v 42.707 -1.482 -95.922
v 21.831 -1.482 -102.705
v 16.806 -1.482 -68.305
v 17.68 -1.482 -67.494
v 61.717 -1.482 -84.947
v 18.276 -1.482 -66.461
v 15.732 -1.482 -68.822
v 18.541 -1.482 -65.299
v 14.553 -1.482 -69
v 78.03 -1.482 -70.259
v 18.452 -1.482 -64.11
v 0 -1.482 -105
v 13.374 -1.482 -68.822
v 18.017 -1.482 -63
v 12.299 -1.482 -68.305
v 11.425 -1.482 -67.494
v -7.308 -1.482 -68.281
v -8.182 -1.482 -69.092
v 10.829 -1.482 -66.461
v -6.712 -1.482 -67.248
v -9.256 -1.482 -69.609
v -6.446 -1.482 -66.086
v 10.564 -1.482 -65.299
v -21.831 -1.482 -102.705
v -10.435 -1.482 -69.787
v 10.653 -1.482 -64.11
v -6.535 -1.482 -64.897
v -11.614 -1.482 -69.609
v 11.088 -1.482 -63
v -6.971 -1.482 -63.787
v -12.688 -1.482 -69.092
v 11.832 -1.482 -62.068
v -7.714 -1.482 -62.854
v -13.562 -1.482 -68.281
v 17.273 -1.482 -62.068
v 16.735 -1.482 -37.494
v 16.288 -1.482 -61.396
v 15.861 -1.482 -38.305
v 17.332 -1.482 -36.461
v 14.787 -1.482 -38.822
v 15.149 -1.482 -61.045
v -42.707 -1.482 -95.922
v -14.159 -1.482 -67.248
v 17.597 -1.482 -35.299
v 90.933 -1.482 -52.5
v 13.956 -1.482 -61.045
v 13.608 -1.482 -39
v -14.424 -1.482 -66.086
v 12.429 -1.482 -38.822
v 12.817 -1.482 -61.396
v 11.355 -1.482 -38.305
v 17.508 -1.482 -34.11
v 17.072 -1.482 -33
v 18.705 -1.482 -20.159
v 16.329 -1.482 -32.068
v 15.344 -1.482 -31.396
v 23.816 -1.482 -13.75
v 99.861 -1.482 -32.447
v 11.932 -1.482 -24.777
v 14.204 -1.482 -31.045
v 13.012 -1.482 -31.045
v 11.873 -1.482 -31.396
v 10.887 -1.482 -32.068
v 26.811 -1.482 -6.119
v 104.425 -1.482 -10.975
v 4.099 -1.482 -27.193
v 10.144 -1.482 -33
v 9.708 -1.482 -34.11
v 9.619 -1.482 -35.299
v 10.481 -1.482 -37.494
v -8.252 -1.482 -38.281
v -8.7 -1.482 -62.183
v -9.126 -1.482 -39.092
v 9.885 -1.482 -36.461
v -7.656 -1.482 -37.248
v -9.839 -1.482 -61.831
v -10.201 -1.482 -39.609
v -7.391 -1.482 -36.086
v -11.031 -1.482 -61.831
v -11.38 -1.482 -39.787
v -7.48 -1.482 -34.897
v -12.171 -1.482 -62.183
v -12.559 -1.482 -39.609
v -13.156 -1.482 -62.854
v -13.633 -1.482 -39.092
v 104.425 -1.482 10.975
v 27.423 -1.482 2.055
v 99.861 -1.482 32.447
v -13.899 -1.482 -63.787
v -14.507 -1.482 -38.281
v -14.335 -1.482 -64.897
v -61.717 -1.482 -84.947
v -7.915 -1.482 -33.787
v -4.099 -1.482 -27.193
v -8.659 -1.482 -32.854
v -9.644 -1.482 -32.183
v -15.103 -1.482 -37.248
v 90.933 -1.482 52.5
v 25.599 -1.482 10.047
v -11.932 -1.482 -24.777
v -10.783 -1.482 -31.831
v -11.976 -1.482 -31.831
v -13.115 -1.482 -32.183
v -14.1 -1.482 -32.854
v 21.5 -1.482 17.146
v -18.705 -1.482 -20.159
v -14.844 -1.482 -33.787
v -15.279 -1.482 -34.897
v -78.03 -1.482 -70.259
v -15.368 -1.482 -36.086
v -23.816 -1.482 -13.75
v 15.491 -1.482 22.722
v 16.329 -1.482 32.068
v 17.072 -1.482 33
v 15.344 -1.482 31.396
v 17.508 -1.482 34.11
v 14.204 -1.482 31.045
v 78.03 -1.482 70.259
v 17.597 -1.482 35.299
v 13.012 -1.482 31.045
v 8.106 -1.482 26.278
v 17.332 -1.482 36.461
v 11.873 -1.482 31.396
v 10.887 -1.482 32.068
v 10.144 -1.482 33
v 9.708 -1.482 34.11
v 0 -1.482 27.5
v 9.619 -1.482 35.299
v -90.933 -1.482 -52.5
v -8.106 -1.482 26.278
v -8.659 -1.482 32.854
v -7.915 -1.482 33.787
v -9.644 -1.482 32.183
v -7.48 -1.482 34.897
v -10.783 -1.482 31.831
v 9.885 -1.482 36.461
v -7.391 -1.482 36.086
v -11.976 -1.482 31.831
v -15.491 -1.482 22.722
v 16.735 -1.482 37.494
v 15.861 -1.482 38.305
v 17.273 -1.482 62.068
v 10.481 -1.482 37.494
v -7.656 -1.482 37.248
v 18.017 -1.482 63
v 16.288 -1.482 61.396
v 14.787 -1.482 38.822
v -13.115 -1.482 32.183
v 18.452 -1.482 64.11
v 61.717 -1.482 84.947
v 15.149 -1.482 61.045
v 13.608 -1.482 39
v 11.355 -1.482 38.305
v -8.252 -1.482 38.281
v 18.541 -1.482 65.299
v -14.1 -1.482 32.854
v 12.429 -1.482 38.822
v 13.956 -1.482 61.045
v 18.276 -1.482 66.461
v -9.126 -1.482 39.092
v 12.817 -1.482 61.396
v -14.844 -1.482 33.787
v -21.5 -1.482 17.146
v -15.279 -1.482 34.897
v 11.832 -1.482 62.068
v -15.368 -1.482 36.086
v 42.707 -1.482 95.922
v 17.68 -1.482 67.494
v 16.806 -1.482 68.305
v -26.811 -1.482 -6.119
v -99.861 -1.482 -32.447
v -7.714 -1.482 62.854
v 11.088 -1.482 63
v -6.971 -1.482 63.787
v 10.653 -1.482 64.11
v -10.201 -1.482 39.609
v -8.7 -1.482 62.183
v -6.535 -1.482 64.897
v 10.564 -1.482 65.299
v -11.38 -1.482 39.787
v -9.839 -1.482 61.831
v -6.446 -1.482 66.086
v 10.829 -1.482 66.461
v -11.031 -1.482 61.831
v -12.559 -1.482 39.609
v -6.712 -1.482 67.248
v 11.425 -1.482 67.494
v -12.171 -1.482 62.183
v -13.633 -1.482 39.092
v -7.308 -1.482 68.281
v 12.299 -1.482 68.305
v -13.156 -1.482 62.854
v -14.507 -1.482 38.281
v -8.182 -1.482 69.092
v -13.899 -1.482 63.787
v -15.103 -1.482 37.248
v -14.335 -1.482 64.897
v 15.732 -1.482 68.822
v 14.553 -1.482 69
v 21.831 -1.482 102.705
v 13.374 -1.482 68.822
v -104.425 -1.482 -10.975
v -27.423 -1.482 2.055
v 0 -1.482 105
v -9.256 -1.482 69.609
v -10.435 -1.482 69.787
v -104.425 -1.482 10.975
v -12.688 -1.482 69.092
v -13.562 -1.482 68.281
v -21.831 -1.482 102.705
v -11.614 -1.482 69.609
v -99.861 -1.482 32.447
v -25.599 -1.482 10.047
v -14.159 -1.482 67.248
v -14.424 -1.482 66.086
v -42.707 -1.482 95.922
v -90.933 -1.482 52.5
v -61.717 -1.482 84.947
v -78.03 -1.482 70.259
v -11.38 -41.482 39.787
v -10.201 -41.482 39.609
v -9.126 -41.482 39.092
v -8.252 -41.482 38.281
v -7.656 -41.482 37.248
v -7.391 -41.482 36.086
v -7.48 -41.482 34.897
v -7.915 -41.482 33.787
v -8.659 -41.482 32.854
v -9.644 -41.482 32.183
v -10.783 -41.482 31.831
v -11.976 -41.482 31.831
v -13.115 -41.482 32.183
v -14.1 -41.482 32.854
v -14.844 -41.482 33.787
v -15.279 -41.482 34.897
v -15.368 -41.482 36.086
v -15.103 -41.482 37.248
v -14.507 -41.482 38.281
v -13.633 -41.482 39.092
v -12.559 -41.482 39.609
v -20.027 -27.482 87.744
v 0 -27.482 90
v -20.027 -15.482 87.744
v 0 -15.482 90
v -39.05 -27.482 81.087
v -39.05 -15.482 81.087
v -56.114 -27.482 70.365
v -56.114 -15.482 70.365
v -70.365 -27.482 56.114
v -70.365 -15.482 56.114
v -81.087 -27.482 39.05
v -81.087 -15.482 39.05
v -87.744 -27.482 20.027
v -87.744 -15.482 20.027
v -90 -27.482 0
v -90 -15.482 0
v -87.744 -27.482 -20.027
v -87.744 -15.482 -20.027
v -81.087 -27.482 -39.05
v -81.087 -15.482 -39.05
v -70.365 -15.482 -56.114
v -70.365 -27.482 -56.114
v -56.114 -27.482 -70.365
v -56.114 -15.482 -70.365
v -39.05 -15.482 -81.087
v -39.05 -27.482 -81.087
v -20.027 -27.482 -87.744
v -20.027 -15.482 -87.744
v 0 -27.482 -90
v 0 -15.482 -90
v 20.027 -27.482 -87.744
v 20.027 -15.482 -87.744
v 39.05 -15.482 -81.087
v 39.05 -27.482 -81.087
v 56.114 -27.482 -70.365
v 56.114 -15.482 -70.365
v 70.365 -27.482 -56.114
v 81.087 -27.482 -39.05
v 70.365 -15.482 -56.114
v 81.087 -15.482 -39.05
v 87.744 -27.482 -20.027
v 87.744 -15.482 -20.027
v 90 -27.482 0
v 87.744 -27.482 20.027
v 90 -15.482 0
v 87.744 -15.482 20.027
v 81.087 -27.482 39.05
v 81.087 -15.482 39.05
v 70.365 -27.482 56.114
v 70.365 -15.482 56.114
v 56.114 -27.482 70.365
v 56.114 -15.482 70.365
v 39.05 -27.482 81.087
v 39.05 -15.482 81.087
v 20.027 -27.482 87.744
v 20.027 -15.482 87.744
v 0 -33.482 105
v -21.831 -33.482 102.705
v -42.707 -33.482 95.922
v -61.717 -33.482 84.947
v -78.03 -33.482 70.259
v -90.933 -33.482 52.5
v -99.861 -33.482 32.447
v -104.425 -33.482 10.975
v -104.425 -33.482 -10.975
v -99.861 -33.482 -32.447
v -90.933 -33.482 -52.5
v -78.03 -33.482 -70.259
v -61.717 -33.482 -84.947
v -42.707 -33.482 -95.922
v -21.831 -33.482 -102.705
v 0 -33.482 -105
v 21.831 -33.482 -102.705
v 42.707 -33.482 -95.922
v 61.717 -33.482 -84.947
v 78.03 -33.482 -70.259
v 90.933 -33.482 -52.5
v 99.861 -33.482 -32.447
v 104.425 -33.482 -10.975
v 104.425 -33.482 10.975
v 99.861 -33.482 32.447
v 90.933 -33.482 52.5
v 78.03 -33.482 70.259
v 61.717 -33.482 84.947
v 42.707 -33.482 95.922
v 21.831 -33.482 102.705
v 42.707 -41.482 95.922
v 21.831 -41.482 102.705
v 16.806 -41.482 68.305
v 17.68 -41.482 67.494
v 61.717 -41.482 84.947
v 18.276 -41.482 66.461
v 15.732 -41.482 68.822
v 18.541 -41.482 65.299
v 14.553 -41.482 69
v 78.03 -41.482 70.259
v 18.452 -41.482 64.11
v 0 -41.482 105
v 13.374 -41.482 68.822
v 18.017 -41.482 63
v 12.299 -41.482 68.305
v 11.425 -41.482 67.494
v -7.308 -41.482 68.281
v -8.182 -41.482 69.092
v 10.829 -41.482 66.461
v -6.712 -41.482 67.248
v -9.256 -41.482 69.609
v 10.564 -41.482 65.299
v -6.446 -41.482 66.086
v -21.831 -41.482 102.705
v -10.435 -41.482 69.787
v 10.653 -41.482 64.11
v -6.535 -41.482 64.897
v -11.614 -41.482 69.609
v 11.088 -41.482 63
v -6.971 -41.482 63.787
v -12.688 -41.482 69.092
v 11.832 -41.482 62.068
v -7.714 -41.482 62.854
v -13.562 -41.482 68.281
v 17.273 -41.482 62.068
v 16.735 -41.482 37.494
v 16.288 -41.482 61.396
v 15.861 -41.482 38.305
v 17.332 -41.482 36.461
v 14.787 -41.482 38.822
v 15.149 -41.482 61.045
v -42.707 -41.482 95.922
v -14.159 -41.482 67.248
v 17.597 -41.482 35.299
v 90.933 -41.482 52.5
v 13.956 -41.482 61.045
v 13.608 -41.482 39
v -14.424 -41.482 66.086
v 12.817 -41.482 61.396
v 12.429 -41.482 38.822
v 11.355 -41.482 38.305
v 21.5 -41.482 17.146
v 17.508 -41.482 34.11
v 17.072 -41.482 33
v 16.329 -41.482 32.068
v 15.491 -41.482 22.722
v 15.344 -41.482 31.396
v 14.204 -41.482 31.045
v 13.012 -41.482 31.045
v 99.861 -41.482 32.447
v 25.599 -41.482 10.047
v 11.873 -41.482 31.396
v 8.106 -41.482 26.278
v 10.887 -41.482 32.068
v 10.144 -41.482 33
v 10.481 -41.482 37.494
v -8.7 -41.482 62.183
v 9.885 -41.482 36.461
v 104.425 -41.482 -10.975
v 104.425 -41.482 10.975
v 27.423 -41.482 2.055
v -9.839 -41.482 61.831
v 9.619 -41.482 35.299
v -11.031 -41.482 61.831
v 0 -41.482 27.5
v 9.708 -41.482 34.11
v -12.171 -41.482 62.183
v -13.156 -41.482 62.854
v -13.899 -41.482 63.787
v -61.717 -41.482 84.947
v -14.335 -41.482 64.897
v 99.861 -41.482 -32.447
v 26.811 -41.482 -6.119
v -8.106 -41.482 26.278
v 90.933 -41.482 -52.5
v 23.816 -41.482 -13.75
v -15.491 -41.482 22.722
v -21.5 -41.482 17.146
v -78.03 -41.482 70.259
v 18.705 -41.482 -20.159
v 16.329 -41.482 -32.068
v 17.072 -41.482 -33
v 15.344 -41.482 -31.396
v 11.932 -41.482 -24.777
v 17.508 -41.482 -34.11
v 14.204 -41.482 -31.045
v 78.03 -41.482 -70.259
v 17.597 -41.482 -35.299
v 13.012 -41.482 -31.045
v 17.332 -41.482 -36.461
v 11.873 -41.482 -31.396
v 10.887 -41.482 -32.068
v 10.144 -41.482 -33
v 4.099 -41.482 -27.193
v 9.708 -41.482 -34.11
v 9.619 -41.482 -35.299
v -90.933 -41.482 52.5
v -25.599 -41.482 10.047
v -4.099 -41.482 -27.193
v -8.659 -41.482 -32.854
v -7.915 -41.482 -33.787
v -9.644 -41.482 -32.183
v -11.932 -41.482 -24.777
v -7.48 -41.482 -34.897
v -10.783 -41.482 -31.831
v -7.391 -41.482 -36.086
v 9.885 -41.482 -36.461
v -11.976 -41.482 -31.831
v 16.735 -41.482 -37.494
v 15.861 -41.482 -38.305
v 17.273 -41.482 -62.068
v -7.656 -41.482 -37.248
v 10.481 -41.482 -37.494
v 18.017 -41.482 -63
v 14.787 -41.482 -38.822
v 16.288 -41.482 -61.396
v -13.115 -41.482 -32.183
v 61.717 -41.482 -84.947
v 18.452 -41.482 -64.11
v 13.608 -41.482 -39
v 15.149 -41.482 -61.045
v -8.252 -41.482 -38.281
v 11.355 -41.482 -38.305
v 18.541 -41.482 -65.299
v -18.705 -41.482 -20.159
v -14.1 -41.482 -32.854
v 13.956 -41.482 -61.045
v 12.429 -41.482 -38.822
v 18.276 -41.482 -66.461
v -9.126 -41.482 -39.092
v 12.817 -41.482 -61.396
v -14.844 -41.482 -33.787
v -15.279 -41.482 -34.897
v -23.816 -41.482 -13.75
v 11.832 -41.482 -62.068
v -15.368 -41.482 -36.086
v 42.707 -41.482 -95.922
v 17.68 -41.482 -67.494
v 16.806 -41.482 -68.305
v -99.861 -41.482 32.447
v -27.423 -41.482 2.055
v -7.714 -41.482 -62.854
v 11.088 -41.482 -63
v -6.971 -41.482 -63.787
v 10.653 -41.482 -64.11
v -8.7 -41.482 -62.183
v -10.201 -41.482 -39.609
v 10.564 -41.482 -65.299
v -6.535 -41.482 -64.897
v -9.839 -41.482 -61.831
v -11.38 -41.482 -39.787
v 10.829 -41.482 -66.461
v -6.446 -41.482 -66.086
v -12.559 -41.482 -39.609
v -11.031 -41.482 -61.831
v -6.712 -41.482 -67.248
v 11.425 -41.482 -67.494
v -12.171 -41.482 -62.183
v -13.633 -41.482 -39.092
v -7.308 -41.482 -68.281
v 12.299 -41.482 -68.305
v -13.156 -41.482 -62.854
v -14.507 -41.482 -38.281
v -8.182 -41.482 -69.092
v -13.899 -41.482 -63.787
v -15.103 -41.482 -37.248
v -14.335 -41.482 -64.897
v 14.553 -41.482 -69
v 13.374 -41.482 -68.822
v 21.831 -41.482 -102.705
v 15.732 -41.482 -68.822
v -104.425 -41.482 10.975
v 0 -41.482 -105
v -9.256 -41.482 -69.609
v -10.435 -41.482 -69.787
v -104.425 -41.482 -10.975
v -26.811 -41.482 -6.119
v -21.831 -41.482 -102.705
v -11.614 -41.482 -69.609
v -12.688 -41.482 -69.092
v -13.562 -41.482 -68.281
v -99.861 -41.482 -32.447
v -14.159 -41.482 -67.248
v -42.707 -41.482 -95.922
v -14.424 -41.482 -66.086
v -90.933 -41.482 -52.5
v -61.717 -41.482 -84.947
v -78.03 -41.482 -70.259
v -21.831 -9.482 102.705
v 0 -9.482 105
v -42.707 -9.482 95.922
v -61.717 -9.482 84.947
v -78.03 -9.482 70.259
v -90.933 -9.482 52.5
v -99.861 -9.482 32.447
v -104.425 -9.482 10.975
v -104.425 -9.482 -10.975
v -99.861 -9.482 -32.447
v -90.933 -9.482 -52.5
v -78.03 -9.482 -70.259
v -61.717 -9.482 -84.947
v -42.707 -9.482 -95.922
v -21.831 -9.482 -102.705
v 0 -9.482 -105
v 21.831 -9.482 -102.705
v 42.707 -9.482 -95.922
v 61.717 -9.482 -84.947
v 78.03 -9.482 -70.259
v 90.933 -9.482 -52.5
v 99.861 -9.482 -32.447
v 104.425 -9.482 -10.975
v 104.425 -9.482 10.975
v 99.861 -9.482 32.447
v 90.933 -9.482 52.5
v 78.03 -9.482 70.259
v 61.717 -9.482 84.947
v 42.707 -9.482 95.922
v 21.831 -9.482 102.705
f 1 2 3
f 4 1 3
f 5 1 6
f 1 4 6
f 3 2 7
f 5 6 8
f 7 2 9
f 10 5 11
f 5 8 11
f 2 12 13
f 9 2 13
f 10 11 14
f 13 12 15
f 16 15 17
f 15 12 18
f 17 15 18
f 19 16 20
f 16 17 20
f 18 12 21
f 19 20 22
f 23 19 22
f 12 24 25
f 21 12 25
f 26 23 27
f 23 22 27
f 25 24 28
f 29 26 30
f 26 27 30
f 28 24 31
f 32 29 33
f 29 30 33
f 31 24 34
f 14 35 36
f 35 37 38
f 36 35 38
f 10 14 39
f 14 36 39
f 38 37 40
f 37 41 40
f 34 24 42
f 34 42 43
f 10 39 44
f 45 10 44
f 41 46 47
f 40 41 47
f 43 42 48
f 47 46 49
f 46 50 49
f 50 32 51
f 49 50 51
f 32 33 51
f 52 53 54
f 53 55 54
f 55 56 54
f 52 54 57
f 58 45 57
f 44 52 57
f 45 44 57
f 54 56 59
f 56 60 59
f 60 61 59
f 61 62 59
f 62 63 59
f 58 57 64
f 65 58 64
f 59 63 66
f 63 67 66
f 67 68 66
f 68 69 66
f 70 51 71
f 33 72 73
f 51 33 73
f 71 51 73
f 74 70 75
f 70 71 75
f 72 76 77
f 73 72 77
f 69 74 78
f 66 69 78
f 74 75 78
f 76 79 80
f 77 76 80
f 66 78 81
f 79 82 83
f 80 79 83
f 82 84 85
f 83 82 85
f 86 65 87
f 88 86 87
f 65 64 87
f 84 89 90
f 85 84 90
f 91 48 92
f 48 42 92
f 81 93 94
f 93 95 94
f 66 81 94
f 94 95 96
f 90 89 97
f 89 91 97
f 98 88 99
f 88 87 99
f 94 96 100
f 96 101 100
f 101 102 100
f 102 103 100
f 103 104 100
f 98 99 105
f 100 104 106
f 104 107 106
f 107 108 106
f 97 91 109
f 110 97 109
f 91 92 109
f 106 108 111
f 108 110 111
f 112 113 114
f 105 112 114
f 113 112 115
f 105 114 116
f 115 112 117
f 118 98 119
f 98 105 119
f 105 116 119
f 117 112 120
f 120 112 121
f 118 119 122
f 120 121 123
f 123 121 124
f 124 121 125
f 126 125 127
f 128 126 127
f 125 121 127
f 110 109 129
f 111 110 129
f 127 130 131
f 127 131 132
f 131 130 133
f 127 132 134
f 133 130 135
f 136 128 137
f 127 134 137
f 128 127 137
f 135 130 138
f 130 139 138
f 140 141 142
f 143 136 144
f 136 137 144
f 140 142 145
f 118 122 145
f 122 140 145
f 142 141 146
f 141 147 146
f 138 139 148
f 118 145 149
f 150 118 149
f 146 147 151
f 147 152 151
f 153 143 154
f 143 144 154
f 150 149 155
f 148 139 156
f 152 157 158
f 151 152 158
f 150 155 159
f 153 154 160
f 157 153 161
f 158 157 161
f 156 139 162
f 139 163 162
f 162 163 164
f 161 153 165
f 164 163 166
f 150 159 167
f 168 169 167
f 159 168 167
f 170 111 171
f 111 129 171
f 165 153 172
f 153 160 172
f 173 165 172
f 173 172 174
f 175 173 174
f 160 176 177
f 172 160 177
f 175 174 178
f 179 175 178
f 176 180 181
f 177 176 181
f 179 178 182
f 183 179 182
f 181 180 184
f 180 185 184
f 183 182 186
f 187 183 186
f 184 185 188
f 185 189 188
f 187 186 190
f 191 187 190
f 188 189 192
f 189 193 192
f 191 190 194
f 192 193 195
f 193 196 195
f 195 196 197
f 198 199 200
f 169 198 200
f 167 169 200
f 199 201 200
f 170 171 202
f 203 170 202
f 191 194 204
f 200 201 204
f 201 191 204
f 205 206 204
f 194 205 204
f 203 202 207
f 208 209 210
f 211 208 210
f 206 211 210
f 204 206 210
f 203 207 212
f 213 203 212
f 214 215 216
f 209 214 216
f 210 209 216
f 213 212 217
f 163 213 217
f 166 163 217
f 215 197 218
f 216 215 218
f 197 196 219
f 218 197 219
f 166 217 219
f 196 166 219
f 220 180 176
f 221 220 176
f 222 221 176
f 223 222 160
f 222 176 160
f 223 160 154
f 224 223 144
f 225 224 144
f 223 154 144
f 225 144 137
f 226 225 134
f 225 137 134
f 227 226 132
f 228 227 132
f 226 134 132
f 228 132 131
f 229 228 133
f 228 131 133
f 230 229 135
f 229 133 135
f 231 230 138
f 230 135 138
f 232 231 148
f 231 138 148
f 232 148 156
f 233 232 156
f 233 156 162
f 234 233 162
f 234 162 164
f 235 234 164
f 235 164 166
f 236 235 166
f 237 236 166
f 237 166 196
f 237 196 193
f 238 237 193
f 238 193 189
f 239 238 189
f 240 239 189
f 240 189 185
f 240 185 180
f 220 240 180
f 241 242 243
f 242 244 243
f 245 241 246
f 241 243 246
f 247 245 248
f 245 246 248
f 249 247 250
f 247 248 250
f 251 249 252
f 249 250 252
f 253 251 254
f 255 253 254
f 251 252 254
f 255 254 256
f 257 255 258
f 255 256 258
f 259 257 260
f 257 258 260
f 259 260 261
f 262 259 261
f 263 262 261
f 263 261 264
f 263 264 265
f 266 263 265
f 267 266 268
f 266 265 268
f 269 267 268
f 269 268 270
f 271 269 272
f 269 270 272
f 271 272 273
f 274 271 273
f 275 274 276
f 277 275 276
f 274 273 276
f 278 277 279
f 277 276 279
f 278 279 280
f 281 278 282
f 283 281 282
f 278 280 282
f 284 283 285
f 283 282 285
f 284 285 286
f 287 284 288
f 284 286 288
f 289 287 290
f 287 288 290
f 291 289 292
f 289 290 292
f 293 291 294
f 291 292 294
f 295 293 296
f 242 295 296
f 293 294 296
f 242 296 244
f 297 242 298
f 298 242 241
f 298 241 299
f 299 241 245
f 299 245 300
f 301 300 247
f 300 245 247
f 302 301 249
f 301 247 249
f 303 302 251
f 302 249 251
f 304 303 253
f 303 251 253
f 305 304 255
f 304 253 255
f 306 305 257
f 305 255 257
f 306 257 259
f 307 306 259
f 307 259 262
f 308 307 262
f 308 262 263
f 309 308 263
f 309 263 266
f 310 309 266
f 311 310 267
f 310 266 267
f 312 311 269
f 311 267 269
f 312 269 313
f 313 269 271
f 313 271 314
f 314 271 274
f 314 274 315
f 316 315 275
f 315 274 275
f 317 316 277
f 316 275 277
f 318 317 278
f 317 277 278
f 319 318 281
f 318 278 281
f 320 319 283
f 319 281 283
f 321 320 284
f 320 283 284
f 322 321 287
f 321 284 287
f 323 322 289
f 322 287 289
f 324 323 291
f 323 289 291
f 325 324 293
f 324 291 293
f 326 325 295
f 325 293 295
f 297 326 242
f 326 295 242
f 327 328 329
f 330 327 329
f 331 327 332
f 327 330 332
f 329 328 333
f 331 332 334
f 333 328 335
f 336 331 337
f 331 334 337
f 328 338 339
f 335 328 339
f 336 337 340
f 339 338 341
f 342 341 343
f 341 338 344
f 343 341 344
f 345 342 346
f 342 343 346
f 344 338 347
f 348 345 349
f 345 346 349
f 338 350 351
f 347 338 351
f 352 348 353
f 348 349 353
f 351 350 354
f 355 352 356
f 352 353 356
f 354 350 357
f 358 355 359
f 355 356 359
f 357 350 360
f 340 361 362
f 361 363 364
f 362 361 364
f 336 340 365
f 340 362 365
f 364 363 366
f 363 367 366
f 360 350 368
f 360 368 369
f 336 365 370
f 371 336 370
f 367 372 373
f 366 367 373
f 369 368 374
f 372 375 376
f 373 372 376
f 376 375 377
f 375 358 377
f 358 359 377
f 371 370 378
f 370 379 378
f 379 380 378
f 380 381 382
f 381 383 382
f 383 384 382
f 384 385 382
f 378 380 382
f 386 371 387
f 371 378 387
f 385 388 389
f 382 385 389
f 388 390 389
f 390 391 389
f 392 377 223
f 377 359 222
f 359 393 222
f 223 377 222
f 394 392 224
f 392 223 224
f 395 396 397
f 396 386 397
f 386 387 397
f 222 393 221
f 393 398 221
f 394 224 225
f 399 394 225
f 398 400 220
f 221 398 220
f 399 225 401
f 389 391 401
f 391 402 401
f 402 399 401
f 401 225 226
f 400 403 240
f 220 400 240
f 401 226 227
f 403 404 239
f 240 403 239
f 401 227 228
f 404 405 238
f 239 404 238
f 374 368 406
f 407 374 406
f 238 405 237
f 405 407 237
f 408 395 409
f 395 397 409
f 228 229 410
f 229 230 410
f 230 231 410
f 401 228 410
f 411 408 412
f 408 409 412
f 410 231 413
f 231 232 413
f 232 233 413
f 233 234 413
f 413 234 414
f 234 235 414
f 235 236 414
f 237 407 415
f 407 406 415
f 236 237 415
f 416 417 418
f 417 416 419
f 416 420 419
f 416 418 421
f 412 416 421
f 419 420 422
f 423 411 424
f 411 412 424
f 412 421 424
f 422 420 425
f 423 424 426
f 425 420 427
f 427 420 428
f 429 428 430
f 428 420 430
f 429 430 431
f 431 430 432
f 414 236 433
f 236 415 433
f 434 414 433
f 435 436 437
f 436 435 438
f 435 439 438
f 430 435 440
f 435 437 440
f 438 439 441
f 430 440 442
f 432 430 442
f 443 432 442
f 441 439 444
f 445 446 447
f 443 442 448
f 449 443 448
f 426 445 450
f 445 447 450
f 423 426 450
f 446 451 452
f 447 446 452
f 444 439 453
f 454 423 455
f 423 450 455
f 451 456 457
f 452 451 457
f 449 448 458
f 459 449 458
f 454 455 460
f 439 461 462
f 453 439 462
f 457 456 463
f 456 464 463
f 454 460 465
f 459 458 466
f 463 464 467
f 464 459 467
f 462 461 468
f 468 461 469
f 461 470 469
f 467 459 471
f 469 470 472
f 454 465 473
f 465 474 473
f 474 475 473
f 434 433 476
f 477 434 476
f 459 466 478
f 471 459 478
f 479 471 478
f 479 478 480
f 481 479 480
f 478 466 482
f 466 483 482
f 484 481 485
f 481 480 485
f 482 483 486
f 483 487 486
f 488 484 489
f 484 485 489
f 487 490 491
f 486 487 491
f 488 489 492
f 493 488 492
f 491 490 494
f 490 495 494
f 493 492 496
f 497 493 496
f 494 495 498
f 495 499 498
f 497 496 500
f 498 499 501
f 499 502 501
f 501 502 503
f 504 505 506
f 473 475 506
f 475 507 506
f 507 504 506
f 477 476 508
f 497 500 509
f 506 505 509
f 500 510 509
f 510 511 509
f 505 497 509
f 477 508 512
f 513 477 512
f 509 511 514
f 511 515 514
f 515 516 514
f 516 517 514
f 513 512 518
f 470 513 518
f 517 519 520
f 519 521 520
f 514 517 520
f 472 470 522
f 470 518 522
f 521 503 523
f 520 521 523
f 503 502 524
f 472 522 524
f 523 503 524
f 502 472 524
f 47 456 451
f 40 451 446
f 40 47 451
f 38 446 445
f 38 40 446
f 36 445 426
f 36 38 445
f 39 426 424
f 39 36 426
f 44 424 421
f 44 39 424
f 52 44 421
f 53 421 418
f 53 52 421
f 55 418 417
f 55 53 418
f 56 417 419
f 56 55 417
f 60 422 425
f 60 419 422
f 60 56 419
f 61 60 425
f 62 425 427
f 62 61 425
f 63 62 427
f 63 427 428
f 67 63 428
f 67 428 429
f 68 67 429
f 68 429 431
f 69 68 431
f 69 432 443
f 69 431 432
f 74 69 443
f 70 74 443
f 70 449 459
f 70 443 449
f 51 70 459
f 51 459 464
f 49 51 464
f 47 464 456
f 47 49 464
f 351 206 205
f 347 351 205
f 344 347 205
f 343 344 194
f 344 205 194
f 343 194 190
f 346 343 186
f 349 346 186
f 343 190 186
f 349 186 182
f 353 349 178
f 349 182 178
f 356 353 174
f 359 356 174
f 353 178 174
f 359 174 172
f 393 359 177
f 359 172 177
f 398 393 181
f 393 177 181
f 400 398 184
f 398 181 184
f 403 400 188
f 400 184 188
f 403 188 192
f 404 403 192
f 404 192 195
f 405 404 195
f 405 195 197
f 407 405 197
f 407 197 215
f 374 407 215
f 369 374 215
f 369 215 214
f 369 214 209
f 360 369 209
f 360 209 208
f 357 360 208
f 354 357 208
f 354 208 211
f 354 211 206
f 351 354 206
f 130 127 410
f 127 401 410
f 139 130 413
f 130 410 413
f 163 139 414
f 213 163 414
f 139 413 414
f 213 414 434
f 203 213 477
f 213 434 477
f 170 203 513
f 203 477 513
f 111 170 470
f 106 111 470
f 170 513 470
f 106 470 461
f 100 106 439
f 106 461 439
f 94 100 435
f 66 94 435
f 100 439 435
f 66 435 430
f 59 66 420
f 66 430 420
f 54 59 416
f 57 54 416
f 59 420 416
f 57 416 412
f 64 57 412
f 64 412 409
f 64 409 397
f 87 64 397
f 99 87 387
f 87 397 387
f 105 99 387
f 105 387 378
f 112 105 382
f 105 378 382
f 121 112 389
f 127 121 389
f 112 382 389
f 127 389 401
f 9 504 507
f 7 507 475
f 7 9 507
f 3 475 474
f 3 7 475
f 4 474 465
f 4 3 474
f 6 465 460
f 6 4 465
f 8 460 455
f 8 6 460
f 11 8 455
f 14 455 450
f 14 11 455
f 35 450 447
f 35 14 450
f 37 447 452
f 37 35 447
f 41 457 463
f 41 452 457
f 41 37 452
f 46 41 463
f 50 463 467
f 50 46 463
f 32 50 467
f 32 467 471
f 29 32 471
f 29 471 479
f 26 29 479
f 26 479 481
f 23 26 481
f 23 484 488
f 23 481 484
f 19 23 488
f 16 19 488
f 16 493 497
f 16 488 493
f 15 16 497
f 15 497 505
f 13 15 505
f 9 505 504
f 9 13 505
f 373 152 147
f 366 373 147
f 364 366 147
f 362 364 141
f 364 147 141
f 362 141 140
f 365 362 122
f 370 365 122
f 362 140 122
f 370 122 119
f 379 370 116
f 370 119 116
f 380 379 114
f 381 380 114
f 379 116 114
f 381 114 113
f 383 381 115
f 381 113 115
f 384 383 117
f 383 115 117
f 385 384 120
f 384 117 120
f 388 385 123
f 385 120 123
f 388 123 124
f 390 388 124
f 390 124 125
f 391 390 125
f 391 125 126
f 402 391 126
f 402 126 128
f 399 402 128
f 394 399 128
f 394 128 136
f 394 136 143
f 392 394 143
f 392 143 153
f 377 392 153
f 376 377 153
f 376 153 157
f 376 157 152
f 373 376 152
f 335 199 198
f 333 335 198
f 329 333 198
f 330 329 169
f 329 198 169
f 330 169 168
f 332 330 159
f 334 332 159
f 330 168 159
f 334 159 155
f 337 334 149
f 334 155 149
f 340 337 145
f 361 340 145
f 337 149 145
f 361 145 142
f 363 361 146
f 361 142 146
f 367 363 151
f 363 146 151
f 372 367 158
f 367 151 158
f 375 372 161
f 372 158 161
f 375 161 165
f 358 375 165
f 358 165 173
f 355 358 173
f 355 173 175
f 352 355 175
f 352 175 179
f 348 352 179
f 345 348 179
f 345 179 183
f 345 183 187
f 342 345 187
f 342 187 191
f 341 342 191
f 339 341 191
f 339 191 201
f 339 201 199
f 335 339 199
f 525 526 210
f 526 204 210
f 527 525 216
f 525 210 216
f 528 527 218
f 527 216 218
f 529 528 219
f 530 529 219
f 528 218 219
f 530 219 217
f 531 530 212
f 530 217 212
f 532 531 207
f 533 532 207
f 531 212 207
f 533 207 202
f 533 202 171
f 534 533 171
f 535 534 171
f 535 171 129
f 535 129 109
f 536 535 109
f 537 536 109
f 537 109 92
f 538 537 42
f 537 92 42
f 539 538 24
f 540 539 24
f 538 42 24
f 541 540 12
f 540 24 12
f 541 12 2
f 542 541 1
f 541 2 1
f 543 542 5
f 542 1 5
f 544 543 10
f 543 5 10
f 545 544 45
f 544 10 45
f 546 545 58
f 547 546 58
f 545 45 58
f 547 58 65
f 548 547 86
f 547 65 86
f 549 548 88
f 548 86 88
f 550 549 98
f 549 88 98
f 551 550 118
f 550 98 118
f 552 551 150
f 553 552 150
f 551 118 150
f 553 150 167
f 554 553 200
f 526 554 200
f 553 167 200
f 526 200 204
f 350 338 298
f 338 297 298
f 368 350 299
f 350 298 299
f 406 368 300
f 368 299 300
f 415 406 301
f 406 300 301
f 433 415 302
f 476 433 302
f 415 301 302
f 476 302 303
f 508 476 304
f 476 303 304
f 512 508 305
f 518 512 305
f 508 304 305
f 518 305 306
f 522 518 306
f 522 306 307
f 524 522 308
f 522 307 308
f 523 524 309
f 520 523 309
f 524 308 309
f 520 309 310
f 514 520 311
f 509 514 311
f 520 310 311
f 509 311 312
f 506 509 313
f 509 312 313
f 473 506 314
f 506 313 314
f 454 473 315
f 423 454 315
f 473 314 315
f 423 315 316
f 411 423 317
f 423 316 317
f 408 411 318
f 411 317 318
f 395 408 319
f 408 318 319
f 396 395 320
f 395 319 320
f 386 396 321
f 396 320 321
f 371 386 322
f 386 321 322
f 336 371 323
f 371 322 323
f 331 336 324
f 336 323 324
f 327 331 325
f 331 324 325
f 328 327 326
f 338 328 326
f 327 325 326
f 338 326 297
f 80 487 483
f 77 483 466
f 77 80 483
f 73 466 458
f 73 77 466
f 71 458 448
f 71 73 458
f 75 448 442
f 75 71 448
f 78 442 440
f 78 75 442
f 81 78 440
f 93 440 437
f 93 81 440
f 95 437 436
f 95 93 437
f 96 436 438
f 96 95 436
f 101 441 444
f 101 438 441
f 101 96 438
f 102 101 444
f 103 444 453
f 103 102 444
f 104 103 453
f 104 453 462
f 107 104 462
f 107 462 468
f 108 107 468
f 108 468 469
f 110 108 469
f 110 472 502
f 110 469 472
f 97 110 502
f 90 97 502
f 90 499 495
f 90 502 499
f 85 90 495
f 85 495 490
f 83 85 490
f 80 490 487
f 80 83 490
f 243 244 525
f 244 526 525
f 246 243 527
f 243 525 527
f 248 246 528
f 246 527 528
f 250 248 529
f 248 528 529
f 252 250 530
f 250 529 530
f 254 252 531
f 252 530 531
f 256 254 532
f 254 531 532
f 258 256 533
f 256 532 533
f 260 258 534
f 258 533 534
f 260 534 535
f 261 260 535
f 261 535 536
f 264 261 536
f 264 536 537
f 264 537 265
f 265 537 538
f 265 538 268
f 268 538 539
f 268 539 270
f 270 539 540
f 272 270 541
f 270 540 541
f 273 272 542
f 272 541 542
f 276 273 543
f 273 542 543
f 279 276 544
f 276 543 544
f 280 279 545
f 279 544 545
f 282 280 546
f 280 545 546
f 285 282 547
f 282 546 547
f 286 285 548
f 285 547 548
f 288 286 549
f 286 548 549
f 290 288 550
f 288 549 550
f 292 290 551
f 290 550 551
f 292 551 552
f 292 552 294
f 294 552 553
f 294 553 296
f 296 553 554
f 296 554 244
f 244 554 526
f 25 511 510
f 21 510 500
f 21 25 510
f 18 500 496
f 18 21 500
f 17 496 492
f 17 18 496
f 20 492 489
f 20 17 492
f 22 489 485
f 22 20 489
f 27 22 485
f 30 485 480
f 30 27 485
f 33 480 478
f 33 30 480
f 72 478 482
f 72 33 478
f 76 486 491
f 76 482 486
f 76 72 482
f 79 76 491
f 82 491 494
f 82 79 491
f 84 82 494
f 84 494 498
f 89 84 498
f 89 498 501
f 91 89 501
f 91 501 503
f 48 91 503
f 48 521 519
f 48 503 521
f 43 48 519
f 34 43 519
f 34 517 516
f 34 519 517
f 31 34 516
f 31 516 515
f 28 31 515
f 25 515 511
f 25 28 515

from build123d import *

# Parameters (mm, degrees)
SKETCH2_R          = 4
CUT_EXTRUDE1_DEPTH = 154.785564992


with BuildPart() as part:
    # Sketch1 → Revolve1 (revolve)
    with BuildSketch(Plane.XY, mode=Mode.PRIVATE) as revolve1_sk:
        Polygon((27.5, -1.48189165), (27.5, -41.48189165), (105, -41.48189165), (105, -33.48189165), (90, -27.48189165), (90, -15.48189165), (105, -9.48189165), (105, -1.48189165), align=None)
    revolve(revolve1_sk.sketch.rotate(Axis((0, 0, 0), (0, -1, 0)), 90), axis=Axis((0, 0, 0), (0, -1, 0)))

    # Sketch2 → Cut-Extrude1 (cut, through all)
    with BuildSketch(Plane(origin=(0, -1.48189165, 0), x_dir=(1, 0, 0), z_dir=(0, 1, 0))):
        with Locations(Location((-11.379541398, -35.786671236, 0), (0, 0, 270))):
            Circle(SKETCH2_R)
        with Locations(Location((13.608078504, -35, 0), (0, 0, 270))):
            Circle(SKETCH2_R)
        with Locations(Location((14.552551693, -65, 0), (0, 0, 270))):
            Circle(SKETCH2_R)
        with Locations(Location((-10.435068209, -65.786671236, 0), (0, 0, 270))):
            Circle(SKETCH2_R)
    cut_extrude1 = extrude(amount=-CUT_EXTRUDE1_DEPTH, mode=Mode.SUBTRACT)

    # Mirror1: Cut-Extrude1 across plane
    add(cut_extrude1.mirror(Plane.XY), mode=Mode.SUBTRACT)


solid = part.part
